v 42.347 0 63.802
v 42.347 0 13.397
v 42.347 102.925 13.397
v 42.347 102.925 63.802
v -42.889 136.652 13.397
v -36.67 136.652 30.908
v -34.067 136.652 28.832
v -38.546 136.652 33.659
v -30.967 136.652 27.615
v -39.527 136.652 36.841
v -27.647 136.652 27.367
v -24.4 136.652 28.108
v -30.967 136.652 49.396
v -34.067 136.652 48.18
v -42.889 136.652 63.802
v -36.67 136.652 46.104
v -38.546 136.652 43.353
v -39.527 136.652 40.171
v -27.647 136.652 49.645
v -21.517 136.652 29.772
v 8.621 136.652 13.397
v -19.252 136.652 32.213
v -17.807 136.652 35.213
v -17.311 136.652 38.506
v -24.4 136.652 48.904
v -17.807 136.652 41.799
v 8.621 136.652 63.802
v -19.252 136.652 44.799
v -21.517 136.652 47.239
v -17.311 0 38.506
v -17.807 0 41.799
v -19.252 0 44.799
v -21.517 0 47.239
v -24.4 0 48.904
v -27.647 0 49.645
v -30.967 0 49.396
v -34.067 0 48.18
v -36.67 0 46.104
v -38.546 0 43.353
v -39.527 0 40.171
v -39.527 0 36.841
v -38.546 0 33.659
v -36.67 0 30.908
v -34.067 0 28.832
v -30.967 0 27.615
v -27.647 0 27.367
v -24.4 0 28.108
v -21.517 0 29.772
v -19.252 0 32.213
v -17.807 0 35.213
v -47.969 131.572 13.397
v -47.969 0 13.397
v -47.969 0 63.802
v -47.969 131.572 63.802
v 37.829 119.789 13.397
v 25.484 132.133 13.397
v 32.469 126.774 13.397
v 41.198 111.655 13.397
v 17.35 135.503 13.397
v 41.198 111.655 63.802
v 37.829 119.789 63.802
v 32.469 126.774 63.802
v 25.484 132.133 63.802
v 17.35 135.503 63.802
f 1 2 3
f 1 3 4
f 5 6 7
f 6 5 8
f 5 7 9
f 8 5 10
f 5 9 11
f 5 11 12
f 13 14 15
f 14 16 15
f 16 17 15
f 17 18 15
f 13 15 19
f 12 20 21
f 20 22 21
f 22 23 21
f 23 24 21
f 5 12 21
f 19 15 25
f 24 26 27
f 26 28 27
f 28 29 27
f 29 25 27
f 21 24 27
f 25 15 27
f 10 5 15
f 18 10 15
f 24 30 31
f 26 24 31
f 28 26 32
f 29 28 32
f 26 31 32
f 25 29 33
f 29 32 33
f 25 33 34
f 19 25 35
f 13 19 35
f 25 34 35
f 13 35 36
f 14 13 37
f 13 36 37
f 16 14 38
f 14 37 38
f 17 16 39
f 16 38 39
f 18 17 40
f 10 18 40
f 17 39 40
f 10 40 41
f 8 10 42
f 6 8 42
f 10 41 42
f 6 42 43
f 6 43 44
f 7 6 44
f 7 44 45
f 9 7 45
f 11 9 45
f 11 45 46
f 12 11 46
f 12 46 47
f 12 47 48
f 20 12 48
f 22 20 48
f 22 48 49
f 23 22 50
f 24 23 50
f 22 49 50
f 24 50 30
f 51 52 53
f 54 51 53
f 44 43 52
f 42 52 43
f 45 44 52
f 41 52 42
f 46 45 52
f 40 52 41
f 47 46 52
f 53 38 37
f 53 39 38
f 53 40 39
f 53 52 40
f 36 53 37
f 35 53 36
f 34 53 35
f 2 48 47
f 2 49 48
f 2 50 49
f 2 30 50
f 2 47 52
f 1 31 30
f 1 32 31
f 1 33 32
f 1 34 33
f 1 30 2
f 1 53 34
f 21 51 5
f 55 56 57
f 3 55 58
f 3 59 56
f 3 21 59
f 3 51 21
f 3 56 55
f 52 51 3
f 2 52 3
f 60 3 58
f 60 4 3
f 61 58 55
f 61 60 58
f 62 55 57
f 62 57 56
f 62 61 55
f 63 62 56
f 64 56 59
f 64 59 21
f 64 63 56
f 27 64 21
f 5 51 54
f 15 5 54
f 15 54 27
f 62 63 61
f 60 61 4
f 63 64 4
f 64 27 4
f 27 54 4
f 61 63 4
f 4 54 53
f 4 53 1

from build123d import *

# Parameters (mm, degrees)
F0_W     = 90.31574
F0_H     = 50.404425
F0_R     = 11.170566
F1_DEPTH = 136.652
F2_R     = 33.726563
F3_SIZE  = 5.08


with BuildPart() as f1:
    # F0 (on Front) → F1 (new body)
    with BuildSketch(Plane.XZ):
        with Locations((-2.810655, 38.599672)):
            Rectangle(F0_W, F0_H)
        with Locations((-28.481312, 38.505986)):
            Circle(F0_R, mode=Mode.SUBTRACT)
    extrude(amount=-F1_DEPTH)

    # F2
    f2_edges = [f1.edges().sort_by_distance(p)[0] for p in [
        (42.347215, 136.652, 38.599672),
    ]]
    fillet(f2_edges, radius=F2_R)

    # F3
    f3_edges = [f1.edges().sort_by_distance(p)[0] for p in [
        (-47.968525, 136.652, 38.599672),
    ]]
    chamfer(f3_edges, length=F3_SIZE)


solid = f1.part
